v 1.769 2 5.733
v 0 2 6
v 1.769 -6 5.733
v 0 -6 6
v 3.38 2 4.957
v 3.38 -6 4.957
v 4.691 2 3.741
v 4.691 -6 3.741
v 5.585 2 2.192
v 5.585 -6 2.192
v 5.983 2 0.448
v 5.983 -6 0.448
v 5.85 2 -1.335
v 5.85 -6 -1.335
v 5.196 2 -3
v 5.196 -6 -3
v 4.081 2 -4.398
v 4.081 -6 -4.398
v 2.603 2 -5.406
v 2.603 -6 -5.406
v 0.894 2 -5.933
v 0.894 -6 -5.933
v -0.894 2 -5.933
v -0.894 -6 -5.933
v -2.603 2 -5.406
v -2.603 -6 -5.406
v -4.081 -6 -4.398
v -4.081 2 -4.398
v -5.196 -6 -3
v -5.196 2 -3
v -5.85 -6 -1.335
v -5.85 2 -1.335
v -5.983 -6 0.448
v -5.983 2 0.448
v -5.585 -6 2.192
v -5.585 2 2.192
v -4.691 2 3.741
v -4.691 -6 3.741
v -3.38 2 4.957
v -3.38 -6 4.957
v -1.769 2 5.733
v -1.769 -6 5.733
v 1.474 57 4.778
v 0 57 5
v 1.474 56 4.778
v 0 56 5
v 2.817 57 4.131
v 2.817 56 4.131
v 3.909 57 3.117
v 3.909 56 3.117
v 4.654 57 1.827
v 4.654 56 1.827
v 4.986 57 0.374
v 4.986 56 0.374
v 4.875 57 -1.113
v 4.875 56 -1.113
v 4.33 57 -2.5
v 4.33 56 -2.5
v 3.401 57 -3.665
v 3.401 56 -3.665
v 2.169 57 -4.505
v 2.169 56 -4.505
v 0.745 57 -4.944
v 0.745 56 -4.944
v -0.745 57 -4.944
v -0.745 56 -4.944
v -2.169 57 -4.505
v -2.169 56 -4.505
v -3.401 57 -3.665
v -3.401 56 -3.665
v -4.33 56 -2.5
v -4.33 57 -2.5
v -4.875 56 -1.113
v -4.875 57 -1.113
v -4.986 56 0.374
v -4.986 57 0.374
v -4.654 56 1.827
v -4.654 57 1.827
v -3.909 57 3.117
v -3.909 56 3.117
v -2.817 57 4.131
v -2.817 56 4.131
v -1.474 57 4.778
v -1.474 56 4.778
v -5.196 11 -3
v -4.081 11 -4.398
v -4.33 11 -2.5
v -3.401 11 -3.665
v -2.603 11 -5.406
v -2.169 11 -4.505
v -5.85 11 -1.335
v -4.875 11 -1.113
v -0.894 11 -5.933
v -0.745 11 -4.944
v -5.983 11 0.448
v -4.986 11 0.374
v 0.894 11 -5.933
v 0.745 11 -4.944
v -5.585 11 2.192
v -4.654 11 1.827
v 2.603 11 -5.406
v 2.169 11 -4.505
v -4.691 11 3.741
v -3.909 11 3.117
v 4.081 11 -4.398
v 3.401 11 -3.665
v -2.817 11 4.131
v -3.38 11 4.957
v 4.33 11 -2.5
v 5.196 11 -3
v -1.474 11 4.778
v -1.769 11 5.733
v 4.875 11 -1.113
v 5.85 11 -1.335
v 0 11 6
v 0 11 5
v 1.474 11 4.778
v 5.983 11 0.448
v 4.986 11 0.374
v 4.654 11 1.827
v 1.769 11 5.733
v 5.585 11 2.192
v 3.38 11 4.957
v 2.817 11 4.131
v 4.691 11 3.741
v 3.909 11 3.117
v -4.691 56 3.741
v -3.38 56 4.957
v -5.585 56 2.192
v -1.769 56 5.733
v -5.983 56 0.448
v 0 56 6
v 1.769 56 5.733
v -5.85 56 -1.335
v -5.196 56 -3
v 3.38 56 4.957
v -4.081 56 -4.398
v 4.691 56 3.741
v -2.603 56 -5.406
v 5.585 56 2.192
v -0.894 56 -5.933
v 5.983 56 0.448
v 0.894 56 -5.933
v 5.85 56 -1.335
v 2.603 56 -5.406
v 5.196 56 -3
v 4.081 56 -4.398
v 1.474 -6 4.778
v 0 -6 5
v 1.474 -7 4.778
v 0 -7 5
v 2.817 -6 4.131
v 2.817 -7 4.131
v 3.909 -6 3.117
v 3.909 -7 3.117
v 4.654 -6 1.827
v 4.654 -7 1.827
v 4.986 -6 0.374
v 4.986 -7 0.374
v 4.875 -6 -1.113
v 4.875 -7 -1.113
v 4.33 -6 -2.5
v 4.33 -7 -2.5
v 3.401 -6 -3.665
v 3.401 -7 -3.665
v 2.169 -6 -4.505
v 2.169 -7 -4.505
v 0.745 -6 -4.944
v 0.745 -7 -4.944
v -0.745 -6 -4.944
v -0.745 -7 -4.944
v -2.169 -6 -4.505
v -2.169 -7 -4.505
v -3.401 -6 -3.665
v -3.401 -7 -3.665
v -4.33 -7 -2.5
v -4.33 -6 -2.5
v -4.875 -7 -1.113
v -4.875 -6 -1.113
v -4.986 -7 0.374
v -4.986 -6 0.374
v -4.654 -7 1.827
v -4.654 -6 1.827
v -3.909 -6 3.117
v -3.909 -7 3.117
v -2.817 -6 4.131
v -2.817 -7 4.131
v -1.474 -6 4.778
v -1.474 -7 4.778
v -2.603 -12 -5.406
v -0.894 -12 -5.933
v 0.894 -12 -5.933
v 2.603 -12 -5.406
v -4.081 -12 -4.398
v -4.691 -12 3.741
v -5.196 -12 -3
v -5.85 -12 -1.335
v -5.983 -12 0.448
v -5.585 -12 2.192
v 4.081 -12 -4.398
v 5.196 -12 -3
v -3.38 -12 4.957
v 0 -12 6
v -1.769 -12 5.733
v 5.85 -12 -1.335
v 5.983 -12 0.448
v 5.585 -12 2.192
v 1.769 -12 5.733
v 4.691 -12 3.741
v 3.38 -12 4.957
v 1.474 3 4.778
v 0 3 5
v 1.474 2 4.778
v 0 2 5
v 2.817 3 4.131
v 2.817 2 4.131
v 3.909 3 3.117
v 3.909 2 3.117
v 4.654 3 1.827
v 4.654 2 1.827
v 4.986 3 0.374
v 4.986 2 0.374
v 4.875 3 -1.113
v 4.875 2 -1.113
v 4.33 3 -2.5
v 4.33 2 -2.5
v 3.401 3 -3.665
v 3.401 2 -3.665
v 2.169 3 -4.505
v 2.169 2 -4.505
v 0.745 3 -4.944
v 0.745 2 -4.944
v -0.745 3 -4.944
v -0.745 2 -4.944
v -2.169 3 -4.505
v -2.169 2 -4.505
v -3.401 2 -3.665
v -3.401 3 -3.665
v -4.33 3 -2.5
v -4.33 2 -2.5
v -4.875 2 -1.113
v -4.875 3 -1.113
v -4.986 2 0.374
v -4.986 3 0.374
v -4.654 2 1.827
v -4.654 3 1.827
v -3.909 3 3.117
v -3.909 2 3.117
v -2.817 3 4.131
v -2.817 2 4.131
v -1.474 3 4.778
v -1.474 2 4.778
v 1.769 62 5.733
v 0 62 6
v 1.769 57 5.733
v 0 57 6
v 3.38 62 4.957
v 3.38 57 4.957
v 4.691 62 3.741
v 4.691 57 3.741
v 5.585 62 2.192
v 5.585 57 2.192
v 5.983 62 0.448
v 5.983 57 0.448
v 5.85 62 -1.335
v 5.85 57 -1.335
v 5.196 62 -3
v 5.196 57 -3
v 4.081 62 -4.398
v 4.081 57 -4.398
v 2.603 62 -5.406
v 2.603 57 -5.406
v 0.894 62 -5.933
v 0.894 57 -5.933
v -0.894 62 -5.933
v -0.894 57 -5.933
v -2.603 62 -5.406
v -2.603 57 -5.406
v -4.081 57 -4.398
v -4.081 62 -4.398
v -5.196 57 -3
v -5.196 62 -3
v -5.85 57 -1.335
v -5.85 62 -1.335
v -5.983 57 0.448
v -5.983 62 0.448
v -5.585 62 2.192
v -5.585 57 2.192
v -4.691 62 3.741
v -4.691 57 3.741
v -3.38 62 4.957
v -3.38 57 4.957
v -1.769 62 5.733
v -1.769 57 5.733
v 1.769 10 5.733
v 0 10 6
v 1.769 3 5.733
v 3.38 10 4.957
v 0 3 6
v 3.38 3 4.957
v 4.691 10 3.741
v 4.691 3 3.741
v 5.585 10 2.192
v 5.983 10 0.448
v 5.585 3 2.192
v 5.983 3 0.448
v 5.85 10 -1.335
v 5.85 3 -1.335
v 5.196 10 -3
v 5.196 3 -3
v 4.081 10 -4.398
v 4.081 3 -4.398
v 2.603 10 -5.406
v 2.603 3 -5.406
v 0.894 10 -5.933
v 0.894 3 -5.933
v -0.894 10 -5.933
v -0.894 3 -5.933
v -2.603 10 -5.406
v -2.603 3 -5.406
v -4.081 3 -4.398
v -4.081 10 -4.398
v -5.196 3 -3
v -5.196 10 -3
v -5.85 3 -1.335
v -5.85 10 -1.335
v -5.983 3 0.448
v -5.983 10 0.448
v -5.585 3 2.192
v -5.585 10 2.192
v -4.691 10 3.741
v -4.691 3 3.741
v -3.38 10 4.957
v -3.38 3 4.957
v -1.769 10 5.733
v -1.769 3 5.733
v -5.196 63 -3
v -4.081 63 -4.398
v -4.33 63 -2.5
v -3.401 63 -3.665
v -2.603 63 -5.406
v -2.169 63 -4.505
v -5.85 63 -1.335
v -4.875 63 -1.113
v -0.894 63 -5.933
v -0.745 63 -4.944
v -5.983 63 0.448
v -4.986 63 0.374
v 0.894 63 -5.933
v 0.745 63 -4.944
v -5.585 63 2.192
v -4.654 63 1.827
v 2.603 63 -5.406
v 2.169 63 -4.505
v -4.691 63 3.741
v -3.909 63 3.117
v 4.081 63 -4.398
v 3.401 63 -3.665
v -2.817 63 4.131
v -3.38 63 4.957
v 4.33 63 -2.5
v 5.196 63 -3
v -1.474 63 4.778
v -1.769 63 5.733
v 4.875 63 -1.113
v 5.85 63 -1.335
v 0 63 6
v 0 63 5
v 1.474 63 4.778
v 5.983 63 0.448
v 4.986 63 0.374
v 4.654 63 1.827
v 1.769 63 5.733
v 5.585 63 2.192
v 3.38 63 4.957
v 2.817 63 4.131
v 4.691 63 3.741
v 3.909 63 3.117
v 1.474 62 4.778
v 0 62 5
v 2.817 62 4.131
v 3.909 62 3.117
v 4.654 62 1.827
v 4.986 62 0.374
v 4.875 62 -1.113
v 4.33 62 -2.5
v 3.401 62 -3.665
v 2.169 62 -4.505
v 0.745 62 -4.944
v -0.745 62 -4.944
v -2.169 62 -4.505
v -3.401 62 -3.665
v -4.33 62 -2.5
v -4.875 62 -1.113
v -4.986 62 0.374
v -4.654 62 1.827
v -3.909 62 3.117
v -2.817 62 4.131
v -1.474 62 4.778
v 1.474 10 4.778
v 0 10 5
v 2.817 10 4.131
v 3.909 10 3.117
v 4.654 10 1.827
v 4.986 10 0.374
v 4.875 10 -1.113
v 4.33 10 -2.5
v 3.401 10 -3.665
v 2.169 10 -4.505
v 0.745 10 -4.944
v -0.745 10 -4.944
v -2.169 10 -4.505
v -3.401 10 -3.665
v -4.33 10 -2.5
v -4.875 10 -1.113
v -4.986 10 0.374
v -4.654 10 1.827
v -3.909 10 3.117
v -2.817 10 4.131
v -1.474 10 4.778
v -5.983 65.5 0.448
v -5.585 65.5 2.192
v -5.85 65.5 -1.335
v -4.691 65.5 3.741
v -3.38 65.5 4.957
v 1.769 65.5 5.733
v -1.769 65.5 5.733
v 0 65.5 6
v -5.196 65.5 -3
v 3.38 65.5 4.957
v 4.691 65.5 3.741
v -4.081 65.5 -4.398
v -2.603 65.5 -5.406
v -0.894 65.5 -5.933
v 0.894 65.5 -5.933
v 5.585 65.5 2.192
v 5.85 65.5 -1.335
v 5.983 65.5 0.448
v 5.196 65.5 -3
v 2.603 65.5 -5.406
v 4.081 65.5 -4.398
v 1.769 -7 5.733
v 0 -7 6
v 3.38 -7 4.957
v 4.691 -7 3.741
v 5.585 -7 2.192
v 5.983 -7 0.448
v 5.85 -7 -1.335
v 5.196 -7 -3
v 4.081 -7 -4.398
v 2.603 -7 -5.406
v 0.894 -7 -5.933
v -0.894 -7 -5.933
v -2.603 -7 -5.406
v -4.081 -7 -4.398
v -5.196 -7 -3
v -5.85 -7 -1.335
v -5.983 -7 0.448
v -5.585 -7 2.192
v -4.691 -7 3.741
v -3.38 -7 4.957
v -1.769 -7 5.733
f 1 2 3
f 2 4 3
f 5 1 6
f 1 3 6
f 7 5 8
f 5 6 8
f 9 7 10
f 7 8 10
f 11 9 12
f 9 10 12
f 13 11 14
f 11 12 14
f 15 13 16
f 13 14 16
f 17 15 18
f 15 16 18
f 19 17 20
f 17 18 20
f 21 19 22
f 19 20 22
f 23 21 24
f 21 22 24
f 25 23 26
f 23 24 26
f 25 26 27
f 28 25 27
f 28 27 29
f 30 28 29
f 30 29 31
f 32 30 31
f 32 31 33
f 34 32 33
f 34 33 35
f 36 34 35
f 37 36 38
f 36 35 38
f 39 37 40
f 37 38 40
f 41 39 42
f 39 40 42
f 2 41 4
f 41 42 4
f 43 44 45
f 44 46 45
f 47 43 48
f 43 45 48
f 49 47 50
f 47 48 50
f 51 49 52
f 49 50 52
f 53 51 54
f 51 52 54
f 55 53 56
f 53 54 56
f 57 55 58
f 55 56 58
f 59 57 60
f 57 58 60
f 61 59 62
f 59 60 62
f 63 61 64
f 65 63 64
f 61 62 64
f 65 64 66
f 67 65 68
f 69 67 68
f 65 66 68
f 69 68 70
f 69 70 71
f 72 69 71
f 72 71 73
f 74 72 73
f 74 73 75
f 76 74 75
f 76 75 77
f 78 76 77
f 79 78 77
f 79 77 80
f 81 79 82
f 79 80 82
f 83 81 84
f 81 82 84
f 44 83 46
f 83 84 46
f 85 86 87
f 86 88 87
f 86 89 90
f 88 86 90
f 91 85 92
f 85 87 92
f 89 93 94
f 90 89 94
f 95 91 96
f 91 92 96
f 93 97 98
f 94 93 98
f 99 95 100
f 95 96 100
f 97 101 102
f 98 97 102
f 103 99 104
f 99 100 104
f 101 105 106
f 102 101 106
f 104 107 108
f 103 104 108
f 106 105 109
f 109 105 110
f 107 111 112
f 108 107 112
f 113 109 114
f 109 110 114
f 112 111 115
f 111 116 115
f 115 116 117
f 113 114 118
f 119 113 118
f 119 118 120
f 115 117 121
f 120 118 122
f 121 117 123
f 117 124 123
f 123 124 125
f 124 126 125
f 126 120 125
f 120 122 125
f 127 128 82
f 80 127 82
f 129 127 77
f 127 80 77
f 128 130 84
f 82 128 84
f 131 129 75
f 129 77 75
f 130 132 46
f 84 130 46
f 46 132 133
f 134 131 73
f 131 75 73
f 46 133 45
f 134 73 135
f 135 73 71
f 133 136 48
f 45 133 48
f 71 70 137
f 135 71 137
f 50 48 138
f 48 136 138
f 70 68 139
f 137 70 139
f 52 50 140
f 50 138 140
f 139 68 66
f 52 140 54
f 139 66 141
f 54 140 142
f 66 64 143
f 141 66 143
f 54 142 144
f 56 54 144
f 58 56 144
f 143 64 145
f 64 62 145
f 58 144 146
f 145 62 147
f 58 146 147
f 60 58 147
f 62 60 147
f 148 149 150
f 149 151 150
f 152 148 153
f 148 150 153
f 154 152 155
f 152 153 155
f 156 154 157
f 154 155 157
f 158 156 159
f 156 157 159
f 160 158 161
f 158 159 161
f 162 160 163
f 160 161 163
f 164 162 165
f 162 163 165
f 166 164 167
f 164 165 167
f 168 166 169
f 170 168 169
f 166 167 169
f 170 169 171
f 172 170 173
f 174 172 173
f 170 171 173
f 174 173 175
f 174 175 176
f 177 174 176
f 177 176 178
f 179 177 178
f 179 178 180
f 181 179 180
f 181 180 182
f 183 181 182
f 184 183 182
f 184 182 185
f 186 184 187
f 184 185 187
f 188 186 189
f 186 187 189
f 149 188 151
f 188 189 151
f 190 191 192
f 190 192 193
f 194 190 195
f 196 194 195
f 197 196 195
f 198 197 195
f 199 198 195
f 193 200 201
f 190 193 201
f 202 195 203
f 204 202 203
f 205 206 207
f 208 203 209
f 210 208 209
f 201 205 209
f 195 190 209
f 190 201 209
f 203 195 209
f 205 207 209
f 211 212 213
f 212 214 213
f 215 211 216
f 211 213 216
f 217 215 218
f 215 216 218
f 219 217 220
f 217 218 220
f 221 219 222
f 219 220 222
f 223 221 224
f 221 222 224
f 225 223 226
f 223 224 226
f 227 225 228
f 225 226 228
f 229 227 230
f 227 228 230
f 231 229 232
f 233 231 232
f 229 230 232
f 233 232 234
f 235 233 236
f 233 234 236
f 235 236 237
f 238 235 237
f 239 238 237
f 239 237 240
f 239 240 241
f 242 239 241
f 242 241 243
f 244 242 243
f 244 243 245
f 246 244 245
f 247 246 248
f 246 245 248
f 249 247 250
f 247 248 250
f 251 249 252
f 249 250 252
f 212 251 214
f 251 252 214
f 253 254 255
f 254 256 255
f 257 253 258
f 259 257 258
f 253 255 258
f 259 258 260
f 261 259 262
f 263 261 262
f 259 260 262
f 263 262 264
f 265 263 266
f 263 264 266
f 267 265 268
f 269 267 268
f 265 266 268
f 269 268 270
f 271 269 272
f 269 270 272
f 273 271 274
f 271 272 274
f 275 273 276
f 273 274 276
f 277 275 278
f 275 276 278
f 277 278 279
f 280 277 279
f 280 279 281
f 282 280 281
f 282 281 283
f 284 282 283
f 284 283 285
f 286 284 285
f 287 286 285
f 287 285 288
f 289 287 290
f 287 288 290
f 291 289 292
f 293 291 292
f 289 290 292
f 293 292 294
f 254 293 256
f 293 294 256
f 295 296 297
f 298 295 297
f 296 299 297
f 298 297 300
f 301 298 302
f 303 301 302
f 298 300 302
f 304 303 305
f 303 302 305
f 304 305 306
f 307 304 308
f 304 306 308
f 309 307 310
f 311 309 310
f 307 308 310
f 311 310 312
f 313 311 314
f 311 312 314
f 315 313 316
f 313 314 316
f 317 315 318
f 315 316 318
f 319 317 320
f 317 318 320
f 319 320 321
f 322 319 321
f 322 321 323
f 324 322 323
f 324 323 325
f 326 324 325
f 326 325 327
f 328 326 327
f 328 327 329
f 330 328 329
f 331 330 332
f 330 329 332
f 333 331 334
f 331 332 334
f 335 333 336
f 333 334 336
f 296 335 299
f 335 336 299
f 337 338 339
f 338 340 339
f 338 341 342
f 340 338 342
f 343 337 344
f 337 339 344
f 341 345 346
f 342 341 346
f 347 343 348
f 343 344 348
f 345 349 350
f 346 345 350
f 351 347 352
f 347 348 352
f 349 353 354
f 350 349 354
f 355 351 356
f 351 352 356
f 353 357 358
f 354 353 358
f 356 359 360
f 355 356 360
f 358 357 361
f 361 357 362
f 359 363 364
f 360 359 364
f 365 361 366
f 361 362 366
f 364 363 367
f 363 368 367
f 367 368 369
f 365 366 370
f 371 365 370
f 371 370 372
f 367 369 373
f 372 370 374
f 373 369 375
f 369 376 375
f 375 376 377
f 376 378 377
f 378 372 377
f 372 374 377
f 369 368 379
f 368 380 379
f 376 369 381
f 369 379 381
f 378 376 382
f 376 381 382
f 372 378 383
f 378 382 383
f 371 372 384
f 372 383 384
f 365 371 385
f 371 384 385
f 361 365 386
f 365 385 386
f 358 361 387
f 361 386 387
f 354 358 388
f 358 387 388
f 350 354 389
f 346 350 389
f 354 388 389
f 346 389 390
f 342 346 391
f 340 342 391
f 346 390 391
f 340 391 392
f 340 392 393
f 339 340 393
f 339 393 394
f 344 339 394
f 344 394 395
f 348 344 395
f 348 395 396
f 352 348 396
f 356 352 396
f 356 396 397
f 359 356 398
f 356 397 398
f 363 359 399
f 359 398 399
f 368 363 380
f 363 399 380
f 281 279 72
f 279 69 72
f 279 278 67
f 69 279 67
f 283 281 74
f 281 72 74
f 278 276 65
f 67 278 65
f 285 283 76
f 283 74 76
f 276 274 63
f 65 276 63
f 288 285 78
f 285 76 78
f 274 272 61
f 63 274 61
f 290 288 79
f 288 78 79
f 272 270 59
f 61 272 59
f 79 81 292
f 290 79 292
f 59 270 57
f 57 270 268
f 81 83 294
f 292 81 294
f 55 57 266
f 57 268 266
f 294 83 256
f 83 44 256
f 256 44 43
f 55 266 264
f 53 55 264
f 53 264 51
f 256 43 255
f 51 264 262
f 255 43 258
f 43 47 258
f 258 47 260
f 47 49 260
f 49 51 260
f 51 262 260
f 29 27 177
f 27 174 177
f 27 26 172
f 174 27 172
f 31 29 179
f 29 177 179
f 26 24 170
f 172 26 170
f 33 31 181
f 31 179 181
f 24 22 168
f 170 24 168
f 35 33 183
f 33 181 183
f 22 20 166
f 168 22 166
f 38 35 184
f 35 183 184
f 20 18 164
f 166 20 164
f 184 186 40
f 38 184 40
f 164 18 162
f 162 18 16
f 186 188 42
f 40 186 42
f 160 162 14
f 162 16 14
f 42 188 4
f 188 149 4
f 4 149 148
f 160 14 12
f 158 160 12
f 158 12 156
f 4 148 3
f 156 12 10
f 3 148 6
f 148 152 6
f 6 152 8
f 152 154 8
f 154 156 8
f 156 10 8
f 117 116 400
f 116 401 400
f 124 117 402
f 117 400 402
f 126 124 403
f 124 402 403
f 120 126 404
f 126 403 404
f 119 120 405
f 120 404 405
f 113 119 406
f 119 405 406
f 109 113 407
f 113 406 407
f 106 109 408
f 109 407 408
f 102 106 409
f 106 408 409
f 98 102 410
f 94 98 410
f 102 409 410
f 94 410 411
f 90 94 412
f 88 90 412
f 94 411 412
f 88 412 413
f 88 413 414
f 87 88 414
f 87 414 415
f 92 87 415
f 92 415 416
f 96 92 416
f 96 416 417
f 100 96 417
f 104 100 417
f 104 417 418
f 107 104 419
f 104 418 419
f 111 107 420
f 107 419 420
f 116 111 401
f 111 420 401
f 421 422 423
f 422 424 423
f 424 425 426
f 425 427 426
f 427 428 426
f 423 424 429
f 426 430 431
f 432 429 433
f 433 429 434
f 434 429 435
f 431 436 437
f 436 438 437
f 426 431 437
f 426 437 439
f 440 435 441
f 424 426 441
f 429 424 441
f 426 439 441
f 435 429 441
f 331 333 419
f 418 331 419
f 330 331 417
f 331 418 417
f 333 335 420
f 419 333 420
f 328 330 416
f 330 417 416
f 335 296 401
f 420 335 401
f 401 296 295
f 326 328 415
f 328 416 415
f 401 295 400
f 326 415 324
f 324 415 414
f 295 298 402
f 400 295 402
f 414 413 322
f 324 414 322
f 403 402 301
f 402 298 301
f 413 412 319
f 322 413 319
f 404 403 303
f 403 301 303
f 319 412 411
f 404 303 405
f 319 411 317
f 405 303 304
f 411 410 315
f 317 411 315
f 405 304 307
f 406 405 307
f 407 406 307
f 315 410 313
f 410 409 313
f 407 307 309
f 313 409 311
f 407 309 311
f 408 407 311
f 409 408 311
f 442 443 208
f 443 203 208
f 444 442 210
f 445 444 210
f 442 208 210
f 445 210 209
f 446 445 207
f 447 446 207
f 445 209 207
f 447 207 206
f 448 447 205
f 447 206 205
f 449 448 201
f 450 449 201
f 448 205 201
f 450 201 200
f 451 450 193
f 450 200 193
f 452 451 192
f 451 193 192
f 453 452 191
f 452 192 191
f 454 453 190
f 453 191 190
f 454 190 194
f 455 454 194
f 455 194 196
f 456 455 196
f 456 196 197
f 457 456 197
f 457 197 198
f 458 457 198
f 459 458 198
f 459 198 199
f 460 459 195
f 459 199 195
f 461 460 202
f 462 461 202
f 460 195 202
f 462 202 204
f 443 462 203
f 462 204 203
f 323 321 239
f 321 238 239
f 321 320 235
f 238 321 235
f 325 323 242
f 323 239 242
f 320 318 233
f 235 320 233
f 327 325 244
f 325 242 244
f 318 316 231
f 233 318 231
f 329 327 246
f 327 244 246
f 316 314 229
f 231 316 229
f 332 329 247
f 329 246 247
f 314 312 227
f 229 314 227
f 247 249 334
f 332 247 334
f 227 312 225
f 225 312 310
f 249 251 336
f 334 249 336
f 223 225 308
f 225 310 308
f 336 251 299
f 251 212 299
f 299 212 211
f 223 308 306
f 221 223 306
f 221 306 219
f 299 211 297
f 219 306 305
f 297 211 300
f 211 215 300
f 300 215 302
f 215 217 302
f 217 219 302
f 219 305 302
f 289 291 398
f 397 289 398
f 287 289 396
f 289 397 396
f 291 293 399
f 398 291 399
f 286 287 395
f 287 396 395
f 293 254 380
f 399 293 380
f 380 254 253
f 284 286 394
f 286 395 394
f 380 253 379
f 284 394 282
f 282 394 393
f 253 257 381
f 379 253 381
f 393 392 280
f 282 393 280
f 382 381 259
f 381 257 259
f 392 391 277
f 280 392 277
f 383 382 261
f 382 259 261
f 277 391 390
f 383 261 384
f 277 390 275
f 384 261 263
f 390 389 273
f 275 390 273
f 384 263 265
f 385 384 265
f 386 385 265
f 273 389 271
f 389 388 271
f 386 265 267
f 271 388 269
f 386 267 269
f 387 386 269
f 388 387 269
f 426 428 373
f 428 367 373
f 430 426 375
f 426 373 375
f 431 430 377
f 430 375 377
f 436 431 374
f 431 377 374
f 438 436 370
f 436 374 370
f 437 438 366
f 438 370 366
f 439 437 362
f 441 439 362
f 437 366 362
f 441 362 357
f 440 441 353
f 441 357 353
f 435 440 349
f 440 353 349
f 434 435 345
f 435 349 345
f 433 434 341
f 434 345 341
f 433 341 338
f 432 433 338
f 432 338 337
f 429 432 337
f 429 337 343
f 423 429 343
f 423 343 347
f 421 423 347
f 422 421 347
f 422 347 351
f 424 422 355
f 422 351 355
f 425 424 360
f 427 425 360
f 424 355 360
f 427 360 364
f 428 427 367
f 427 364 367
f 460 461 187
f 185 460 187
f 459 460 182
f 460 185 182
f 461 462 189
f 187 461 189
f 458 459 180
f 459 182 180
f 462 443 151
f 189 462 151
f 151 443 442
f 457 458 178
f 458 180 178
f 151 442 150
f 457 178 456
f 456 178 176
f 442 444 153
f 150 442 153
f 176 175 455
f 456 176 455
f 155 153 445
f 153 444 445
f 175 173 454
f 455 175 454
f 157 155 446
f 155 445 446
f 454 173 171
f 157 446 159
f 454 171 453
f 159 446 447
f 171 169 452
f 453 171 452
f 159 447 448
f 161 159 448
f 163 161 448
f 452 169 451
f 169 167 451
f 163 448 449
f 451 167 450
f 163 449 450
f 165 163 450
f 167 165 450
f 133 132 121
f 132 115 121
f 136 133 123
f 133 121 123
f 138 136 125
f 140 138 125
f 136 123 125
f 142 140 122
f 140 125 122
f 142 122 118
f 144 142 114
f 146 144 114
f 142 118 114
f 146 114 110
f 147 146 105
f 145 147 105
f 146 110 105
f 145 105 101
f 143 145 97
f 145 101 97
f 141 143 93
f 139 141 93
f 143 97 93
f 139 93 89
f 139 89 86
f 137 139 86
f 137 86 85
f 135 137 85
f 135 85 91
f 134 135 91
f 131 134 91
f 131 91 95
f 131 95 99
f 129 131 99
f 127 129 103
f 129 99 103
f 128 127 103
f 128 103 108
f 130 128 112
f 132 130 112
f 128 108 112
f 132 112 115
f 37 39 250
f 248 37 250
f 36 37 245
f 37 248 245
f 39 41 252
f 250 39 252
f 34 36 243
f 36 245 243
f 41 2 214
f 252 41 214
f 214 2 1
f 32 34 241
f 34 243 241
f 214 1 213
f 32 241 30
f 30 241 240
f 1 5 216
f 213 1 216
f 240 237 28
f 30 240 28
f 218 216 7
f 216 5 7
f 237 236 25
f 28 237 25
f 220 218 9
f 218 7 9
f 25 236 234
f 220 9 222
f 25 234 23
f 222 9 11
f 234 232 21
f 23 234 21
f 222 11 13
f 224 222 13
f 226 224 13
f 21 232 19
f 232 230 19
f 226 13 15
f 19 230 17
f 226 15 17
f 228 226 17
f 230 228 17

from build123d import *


with BuildPart() as f1:
    # F0 (on Right) → F1 (revolve)
    with BuildSketch(Plane.YZ):
        Polygon((2, 6), (0, 6), (-6, 6), (-6, 5), (-7, 5), (-7, 6), (-12, 6), (-12, 0), (0, 0), (65.5, 0), (65.5, 6), (63, 6), (63, 5), (62, 5), (62, 6), (57, 6), (57, 5), (56, 5), (56, 6), (30, 6), (29, 6), (11, 6), (11, 5), (10, 5), (10, 6), (3, 6), (3, 5), (2, 5), align=None)
    revolve(axis=Axis((0, 32.75, 0), (0, 1, 0)))


solid = f1.part
